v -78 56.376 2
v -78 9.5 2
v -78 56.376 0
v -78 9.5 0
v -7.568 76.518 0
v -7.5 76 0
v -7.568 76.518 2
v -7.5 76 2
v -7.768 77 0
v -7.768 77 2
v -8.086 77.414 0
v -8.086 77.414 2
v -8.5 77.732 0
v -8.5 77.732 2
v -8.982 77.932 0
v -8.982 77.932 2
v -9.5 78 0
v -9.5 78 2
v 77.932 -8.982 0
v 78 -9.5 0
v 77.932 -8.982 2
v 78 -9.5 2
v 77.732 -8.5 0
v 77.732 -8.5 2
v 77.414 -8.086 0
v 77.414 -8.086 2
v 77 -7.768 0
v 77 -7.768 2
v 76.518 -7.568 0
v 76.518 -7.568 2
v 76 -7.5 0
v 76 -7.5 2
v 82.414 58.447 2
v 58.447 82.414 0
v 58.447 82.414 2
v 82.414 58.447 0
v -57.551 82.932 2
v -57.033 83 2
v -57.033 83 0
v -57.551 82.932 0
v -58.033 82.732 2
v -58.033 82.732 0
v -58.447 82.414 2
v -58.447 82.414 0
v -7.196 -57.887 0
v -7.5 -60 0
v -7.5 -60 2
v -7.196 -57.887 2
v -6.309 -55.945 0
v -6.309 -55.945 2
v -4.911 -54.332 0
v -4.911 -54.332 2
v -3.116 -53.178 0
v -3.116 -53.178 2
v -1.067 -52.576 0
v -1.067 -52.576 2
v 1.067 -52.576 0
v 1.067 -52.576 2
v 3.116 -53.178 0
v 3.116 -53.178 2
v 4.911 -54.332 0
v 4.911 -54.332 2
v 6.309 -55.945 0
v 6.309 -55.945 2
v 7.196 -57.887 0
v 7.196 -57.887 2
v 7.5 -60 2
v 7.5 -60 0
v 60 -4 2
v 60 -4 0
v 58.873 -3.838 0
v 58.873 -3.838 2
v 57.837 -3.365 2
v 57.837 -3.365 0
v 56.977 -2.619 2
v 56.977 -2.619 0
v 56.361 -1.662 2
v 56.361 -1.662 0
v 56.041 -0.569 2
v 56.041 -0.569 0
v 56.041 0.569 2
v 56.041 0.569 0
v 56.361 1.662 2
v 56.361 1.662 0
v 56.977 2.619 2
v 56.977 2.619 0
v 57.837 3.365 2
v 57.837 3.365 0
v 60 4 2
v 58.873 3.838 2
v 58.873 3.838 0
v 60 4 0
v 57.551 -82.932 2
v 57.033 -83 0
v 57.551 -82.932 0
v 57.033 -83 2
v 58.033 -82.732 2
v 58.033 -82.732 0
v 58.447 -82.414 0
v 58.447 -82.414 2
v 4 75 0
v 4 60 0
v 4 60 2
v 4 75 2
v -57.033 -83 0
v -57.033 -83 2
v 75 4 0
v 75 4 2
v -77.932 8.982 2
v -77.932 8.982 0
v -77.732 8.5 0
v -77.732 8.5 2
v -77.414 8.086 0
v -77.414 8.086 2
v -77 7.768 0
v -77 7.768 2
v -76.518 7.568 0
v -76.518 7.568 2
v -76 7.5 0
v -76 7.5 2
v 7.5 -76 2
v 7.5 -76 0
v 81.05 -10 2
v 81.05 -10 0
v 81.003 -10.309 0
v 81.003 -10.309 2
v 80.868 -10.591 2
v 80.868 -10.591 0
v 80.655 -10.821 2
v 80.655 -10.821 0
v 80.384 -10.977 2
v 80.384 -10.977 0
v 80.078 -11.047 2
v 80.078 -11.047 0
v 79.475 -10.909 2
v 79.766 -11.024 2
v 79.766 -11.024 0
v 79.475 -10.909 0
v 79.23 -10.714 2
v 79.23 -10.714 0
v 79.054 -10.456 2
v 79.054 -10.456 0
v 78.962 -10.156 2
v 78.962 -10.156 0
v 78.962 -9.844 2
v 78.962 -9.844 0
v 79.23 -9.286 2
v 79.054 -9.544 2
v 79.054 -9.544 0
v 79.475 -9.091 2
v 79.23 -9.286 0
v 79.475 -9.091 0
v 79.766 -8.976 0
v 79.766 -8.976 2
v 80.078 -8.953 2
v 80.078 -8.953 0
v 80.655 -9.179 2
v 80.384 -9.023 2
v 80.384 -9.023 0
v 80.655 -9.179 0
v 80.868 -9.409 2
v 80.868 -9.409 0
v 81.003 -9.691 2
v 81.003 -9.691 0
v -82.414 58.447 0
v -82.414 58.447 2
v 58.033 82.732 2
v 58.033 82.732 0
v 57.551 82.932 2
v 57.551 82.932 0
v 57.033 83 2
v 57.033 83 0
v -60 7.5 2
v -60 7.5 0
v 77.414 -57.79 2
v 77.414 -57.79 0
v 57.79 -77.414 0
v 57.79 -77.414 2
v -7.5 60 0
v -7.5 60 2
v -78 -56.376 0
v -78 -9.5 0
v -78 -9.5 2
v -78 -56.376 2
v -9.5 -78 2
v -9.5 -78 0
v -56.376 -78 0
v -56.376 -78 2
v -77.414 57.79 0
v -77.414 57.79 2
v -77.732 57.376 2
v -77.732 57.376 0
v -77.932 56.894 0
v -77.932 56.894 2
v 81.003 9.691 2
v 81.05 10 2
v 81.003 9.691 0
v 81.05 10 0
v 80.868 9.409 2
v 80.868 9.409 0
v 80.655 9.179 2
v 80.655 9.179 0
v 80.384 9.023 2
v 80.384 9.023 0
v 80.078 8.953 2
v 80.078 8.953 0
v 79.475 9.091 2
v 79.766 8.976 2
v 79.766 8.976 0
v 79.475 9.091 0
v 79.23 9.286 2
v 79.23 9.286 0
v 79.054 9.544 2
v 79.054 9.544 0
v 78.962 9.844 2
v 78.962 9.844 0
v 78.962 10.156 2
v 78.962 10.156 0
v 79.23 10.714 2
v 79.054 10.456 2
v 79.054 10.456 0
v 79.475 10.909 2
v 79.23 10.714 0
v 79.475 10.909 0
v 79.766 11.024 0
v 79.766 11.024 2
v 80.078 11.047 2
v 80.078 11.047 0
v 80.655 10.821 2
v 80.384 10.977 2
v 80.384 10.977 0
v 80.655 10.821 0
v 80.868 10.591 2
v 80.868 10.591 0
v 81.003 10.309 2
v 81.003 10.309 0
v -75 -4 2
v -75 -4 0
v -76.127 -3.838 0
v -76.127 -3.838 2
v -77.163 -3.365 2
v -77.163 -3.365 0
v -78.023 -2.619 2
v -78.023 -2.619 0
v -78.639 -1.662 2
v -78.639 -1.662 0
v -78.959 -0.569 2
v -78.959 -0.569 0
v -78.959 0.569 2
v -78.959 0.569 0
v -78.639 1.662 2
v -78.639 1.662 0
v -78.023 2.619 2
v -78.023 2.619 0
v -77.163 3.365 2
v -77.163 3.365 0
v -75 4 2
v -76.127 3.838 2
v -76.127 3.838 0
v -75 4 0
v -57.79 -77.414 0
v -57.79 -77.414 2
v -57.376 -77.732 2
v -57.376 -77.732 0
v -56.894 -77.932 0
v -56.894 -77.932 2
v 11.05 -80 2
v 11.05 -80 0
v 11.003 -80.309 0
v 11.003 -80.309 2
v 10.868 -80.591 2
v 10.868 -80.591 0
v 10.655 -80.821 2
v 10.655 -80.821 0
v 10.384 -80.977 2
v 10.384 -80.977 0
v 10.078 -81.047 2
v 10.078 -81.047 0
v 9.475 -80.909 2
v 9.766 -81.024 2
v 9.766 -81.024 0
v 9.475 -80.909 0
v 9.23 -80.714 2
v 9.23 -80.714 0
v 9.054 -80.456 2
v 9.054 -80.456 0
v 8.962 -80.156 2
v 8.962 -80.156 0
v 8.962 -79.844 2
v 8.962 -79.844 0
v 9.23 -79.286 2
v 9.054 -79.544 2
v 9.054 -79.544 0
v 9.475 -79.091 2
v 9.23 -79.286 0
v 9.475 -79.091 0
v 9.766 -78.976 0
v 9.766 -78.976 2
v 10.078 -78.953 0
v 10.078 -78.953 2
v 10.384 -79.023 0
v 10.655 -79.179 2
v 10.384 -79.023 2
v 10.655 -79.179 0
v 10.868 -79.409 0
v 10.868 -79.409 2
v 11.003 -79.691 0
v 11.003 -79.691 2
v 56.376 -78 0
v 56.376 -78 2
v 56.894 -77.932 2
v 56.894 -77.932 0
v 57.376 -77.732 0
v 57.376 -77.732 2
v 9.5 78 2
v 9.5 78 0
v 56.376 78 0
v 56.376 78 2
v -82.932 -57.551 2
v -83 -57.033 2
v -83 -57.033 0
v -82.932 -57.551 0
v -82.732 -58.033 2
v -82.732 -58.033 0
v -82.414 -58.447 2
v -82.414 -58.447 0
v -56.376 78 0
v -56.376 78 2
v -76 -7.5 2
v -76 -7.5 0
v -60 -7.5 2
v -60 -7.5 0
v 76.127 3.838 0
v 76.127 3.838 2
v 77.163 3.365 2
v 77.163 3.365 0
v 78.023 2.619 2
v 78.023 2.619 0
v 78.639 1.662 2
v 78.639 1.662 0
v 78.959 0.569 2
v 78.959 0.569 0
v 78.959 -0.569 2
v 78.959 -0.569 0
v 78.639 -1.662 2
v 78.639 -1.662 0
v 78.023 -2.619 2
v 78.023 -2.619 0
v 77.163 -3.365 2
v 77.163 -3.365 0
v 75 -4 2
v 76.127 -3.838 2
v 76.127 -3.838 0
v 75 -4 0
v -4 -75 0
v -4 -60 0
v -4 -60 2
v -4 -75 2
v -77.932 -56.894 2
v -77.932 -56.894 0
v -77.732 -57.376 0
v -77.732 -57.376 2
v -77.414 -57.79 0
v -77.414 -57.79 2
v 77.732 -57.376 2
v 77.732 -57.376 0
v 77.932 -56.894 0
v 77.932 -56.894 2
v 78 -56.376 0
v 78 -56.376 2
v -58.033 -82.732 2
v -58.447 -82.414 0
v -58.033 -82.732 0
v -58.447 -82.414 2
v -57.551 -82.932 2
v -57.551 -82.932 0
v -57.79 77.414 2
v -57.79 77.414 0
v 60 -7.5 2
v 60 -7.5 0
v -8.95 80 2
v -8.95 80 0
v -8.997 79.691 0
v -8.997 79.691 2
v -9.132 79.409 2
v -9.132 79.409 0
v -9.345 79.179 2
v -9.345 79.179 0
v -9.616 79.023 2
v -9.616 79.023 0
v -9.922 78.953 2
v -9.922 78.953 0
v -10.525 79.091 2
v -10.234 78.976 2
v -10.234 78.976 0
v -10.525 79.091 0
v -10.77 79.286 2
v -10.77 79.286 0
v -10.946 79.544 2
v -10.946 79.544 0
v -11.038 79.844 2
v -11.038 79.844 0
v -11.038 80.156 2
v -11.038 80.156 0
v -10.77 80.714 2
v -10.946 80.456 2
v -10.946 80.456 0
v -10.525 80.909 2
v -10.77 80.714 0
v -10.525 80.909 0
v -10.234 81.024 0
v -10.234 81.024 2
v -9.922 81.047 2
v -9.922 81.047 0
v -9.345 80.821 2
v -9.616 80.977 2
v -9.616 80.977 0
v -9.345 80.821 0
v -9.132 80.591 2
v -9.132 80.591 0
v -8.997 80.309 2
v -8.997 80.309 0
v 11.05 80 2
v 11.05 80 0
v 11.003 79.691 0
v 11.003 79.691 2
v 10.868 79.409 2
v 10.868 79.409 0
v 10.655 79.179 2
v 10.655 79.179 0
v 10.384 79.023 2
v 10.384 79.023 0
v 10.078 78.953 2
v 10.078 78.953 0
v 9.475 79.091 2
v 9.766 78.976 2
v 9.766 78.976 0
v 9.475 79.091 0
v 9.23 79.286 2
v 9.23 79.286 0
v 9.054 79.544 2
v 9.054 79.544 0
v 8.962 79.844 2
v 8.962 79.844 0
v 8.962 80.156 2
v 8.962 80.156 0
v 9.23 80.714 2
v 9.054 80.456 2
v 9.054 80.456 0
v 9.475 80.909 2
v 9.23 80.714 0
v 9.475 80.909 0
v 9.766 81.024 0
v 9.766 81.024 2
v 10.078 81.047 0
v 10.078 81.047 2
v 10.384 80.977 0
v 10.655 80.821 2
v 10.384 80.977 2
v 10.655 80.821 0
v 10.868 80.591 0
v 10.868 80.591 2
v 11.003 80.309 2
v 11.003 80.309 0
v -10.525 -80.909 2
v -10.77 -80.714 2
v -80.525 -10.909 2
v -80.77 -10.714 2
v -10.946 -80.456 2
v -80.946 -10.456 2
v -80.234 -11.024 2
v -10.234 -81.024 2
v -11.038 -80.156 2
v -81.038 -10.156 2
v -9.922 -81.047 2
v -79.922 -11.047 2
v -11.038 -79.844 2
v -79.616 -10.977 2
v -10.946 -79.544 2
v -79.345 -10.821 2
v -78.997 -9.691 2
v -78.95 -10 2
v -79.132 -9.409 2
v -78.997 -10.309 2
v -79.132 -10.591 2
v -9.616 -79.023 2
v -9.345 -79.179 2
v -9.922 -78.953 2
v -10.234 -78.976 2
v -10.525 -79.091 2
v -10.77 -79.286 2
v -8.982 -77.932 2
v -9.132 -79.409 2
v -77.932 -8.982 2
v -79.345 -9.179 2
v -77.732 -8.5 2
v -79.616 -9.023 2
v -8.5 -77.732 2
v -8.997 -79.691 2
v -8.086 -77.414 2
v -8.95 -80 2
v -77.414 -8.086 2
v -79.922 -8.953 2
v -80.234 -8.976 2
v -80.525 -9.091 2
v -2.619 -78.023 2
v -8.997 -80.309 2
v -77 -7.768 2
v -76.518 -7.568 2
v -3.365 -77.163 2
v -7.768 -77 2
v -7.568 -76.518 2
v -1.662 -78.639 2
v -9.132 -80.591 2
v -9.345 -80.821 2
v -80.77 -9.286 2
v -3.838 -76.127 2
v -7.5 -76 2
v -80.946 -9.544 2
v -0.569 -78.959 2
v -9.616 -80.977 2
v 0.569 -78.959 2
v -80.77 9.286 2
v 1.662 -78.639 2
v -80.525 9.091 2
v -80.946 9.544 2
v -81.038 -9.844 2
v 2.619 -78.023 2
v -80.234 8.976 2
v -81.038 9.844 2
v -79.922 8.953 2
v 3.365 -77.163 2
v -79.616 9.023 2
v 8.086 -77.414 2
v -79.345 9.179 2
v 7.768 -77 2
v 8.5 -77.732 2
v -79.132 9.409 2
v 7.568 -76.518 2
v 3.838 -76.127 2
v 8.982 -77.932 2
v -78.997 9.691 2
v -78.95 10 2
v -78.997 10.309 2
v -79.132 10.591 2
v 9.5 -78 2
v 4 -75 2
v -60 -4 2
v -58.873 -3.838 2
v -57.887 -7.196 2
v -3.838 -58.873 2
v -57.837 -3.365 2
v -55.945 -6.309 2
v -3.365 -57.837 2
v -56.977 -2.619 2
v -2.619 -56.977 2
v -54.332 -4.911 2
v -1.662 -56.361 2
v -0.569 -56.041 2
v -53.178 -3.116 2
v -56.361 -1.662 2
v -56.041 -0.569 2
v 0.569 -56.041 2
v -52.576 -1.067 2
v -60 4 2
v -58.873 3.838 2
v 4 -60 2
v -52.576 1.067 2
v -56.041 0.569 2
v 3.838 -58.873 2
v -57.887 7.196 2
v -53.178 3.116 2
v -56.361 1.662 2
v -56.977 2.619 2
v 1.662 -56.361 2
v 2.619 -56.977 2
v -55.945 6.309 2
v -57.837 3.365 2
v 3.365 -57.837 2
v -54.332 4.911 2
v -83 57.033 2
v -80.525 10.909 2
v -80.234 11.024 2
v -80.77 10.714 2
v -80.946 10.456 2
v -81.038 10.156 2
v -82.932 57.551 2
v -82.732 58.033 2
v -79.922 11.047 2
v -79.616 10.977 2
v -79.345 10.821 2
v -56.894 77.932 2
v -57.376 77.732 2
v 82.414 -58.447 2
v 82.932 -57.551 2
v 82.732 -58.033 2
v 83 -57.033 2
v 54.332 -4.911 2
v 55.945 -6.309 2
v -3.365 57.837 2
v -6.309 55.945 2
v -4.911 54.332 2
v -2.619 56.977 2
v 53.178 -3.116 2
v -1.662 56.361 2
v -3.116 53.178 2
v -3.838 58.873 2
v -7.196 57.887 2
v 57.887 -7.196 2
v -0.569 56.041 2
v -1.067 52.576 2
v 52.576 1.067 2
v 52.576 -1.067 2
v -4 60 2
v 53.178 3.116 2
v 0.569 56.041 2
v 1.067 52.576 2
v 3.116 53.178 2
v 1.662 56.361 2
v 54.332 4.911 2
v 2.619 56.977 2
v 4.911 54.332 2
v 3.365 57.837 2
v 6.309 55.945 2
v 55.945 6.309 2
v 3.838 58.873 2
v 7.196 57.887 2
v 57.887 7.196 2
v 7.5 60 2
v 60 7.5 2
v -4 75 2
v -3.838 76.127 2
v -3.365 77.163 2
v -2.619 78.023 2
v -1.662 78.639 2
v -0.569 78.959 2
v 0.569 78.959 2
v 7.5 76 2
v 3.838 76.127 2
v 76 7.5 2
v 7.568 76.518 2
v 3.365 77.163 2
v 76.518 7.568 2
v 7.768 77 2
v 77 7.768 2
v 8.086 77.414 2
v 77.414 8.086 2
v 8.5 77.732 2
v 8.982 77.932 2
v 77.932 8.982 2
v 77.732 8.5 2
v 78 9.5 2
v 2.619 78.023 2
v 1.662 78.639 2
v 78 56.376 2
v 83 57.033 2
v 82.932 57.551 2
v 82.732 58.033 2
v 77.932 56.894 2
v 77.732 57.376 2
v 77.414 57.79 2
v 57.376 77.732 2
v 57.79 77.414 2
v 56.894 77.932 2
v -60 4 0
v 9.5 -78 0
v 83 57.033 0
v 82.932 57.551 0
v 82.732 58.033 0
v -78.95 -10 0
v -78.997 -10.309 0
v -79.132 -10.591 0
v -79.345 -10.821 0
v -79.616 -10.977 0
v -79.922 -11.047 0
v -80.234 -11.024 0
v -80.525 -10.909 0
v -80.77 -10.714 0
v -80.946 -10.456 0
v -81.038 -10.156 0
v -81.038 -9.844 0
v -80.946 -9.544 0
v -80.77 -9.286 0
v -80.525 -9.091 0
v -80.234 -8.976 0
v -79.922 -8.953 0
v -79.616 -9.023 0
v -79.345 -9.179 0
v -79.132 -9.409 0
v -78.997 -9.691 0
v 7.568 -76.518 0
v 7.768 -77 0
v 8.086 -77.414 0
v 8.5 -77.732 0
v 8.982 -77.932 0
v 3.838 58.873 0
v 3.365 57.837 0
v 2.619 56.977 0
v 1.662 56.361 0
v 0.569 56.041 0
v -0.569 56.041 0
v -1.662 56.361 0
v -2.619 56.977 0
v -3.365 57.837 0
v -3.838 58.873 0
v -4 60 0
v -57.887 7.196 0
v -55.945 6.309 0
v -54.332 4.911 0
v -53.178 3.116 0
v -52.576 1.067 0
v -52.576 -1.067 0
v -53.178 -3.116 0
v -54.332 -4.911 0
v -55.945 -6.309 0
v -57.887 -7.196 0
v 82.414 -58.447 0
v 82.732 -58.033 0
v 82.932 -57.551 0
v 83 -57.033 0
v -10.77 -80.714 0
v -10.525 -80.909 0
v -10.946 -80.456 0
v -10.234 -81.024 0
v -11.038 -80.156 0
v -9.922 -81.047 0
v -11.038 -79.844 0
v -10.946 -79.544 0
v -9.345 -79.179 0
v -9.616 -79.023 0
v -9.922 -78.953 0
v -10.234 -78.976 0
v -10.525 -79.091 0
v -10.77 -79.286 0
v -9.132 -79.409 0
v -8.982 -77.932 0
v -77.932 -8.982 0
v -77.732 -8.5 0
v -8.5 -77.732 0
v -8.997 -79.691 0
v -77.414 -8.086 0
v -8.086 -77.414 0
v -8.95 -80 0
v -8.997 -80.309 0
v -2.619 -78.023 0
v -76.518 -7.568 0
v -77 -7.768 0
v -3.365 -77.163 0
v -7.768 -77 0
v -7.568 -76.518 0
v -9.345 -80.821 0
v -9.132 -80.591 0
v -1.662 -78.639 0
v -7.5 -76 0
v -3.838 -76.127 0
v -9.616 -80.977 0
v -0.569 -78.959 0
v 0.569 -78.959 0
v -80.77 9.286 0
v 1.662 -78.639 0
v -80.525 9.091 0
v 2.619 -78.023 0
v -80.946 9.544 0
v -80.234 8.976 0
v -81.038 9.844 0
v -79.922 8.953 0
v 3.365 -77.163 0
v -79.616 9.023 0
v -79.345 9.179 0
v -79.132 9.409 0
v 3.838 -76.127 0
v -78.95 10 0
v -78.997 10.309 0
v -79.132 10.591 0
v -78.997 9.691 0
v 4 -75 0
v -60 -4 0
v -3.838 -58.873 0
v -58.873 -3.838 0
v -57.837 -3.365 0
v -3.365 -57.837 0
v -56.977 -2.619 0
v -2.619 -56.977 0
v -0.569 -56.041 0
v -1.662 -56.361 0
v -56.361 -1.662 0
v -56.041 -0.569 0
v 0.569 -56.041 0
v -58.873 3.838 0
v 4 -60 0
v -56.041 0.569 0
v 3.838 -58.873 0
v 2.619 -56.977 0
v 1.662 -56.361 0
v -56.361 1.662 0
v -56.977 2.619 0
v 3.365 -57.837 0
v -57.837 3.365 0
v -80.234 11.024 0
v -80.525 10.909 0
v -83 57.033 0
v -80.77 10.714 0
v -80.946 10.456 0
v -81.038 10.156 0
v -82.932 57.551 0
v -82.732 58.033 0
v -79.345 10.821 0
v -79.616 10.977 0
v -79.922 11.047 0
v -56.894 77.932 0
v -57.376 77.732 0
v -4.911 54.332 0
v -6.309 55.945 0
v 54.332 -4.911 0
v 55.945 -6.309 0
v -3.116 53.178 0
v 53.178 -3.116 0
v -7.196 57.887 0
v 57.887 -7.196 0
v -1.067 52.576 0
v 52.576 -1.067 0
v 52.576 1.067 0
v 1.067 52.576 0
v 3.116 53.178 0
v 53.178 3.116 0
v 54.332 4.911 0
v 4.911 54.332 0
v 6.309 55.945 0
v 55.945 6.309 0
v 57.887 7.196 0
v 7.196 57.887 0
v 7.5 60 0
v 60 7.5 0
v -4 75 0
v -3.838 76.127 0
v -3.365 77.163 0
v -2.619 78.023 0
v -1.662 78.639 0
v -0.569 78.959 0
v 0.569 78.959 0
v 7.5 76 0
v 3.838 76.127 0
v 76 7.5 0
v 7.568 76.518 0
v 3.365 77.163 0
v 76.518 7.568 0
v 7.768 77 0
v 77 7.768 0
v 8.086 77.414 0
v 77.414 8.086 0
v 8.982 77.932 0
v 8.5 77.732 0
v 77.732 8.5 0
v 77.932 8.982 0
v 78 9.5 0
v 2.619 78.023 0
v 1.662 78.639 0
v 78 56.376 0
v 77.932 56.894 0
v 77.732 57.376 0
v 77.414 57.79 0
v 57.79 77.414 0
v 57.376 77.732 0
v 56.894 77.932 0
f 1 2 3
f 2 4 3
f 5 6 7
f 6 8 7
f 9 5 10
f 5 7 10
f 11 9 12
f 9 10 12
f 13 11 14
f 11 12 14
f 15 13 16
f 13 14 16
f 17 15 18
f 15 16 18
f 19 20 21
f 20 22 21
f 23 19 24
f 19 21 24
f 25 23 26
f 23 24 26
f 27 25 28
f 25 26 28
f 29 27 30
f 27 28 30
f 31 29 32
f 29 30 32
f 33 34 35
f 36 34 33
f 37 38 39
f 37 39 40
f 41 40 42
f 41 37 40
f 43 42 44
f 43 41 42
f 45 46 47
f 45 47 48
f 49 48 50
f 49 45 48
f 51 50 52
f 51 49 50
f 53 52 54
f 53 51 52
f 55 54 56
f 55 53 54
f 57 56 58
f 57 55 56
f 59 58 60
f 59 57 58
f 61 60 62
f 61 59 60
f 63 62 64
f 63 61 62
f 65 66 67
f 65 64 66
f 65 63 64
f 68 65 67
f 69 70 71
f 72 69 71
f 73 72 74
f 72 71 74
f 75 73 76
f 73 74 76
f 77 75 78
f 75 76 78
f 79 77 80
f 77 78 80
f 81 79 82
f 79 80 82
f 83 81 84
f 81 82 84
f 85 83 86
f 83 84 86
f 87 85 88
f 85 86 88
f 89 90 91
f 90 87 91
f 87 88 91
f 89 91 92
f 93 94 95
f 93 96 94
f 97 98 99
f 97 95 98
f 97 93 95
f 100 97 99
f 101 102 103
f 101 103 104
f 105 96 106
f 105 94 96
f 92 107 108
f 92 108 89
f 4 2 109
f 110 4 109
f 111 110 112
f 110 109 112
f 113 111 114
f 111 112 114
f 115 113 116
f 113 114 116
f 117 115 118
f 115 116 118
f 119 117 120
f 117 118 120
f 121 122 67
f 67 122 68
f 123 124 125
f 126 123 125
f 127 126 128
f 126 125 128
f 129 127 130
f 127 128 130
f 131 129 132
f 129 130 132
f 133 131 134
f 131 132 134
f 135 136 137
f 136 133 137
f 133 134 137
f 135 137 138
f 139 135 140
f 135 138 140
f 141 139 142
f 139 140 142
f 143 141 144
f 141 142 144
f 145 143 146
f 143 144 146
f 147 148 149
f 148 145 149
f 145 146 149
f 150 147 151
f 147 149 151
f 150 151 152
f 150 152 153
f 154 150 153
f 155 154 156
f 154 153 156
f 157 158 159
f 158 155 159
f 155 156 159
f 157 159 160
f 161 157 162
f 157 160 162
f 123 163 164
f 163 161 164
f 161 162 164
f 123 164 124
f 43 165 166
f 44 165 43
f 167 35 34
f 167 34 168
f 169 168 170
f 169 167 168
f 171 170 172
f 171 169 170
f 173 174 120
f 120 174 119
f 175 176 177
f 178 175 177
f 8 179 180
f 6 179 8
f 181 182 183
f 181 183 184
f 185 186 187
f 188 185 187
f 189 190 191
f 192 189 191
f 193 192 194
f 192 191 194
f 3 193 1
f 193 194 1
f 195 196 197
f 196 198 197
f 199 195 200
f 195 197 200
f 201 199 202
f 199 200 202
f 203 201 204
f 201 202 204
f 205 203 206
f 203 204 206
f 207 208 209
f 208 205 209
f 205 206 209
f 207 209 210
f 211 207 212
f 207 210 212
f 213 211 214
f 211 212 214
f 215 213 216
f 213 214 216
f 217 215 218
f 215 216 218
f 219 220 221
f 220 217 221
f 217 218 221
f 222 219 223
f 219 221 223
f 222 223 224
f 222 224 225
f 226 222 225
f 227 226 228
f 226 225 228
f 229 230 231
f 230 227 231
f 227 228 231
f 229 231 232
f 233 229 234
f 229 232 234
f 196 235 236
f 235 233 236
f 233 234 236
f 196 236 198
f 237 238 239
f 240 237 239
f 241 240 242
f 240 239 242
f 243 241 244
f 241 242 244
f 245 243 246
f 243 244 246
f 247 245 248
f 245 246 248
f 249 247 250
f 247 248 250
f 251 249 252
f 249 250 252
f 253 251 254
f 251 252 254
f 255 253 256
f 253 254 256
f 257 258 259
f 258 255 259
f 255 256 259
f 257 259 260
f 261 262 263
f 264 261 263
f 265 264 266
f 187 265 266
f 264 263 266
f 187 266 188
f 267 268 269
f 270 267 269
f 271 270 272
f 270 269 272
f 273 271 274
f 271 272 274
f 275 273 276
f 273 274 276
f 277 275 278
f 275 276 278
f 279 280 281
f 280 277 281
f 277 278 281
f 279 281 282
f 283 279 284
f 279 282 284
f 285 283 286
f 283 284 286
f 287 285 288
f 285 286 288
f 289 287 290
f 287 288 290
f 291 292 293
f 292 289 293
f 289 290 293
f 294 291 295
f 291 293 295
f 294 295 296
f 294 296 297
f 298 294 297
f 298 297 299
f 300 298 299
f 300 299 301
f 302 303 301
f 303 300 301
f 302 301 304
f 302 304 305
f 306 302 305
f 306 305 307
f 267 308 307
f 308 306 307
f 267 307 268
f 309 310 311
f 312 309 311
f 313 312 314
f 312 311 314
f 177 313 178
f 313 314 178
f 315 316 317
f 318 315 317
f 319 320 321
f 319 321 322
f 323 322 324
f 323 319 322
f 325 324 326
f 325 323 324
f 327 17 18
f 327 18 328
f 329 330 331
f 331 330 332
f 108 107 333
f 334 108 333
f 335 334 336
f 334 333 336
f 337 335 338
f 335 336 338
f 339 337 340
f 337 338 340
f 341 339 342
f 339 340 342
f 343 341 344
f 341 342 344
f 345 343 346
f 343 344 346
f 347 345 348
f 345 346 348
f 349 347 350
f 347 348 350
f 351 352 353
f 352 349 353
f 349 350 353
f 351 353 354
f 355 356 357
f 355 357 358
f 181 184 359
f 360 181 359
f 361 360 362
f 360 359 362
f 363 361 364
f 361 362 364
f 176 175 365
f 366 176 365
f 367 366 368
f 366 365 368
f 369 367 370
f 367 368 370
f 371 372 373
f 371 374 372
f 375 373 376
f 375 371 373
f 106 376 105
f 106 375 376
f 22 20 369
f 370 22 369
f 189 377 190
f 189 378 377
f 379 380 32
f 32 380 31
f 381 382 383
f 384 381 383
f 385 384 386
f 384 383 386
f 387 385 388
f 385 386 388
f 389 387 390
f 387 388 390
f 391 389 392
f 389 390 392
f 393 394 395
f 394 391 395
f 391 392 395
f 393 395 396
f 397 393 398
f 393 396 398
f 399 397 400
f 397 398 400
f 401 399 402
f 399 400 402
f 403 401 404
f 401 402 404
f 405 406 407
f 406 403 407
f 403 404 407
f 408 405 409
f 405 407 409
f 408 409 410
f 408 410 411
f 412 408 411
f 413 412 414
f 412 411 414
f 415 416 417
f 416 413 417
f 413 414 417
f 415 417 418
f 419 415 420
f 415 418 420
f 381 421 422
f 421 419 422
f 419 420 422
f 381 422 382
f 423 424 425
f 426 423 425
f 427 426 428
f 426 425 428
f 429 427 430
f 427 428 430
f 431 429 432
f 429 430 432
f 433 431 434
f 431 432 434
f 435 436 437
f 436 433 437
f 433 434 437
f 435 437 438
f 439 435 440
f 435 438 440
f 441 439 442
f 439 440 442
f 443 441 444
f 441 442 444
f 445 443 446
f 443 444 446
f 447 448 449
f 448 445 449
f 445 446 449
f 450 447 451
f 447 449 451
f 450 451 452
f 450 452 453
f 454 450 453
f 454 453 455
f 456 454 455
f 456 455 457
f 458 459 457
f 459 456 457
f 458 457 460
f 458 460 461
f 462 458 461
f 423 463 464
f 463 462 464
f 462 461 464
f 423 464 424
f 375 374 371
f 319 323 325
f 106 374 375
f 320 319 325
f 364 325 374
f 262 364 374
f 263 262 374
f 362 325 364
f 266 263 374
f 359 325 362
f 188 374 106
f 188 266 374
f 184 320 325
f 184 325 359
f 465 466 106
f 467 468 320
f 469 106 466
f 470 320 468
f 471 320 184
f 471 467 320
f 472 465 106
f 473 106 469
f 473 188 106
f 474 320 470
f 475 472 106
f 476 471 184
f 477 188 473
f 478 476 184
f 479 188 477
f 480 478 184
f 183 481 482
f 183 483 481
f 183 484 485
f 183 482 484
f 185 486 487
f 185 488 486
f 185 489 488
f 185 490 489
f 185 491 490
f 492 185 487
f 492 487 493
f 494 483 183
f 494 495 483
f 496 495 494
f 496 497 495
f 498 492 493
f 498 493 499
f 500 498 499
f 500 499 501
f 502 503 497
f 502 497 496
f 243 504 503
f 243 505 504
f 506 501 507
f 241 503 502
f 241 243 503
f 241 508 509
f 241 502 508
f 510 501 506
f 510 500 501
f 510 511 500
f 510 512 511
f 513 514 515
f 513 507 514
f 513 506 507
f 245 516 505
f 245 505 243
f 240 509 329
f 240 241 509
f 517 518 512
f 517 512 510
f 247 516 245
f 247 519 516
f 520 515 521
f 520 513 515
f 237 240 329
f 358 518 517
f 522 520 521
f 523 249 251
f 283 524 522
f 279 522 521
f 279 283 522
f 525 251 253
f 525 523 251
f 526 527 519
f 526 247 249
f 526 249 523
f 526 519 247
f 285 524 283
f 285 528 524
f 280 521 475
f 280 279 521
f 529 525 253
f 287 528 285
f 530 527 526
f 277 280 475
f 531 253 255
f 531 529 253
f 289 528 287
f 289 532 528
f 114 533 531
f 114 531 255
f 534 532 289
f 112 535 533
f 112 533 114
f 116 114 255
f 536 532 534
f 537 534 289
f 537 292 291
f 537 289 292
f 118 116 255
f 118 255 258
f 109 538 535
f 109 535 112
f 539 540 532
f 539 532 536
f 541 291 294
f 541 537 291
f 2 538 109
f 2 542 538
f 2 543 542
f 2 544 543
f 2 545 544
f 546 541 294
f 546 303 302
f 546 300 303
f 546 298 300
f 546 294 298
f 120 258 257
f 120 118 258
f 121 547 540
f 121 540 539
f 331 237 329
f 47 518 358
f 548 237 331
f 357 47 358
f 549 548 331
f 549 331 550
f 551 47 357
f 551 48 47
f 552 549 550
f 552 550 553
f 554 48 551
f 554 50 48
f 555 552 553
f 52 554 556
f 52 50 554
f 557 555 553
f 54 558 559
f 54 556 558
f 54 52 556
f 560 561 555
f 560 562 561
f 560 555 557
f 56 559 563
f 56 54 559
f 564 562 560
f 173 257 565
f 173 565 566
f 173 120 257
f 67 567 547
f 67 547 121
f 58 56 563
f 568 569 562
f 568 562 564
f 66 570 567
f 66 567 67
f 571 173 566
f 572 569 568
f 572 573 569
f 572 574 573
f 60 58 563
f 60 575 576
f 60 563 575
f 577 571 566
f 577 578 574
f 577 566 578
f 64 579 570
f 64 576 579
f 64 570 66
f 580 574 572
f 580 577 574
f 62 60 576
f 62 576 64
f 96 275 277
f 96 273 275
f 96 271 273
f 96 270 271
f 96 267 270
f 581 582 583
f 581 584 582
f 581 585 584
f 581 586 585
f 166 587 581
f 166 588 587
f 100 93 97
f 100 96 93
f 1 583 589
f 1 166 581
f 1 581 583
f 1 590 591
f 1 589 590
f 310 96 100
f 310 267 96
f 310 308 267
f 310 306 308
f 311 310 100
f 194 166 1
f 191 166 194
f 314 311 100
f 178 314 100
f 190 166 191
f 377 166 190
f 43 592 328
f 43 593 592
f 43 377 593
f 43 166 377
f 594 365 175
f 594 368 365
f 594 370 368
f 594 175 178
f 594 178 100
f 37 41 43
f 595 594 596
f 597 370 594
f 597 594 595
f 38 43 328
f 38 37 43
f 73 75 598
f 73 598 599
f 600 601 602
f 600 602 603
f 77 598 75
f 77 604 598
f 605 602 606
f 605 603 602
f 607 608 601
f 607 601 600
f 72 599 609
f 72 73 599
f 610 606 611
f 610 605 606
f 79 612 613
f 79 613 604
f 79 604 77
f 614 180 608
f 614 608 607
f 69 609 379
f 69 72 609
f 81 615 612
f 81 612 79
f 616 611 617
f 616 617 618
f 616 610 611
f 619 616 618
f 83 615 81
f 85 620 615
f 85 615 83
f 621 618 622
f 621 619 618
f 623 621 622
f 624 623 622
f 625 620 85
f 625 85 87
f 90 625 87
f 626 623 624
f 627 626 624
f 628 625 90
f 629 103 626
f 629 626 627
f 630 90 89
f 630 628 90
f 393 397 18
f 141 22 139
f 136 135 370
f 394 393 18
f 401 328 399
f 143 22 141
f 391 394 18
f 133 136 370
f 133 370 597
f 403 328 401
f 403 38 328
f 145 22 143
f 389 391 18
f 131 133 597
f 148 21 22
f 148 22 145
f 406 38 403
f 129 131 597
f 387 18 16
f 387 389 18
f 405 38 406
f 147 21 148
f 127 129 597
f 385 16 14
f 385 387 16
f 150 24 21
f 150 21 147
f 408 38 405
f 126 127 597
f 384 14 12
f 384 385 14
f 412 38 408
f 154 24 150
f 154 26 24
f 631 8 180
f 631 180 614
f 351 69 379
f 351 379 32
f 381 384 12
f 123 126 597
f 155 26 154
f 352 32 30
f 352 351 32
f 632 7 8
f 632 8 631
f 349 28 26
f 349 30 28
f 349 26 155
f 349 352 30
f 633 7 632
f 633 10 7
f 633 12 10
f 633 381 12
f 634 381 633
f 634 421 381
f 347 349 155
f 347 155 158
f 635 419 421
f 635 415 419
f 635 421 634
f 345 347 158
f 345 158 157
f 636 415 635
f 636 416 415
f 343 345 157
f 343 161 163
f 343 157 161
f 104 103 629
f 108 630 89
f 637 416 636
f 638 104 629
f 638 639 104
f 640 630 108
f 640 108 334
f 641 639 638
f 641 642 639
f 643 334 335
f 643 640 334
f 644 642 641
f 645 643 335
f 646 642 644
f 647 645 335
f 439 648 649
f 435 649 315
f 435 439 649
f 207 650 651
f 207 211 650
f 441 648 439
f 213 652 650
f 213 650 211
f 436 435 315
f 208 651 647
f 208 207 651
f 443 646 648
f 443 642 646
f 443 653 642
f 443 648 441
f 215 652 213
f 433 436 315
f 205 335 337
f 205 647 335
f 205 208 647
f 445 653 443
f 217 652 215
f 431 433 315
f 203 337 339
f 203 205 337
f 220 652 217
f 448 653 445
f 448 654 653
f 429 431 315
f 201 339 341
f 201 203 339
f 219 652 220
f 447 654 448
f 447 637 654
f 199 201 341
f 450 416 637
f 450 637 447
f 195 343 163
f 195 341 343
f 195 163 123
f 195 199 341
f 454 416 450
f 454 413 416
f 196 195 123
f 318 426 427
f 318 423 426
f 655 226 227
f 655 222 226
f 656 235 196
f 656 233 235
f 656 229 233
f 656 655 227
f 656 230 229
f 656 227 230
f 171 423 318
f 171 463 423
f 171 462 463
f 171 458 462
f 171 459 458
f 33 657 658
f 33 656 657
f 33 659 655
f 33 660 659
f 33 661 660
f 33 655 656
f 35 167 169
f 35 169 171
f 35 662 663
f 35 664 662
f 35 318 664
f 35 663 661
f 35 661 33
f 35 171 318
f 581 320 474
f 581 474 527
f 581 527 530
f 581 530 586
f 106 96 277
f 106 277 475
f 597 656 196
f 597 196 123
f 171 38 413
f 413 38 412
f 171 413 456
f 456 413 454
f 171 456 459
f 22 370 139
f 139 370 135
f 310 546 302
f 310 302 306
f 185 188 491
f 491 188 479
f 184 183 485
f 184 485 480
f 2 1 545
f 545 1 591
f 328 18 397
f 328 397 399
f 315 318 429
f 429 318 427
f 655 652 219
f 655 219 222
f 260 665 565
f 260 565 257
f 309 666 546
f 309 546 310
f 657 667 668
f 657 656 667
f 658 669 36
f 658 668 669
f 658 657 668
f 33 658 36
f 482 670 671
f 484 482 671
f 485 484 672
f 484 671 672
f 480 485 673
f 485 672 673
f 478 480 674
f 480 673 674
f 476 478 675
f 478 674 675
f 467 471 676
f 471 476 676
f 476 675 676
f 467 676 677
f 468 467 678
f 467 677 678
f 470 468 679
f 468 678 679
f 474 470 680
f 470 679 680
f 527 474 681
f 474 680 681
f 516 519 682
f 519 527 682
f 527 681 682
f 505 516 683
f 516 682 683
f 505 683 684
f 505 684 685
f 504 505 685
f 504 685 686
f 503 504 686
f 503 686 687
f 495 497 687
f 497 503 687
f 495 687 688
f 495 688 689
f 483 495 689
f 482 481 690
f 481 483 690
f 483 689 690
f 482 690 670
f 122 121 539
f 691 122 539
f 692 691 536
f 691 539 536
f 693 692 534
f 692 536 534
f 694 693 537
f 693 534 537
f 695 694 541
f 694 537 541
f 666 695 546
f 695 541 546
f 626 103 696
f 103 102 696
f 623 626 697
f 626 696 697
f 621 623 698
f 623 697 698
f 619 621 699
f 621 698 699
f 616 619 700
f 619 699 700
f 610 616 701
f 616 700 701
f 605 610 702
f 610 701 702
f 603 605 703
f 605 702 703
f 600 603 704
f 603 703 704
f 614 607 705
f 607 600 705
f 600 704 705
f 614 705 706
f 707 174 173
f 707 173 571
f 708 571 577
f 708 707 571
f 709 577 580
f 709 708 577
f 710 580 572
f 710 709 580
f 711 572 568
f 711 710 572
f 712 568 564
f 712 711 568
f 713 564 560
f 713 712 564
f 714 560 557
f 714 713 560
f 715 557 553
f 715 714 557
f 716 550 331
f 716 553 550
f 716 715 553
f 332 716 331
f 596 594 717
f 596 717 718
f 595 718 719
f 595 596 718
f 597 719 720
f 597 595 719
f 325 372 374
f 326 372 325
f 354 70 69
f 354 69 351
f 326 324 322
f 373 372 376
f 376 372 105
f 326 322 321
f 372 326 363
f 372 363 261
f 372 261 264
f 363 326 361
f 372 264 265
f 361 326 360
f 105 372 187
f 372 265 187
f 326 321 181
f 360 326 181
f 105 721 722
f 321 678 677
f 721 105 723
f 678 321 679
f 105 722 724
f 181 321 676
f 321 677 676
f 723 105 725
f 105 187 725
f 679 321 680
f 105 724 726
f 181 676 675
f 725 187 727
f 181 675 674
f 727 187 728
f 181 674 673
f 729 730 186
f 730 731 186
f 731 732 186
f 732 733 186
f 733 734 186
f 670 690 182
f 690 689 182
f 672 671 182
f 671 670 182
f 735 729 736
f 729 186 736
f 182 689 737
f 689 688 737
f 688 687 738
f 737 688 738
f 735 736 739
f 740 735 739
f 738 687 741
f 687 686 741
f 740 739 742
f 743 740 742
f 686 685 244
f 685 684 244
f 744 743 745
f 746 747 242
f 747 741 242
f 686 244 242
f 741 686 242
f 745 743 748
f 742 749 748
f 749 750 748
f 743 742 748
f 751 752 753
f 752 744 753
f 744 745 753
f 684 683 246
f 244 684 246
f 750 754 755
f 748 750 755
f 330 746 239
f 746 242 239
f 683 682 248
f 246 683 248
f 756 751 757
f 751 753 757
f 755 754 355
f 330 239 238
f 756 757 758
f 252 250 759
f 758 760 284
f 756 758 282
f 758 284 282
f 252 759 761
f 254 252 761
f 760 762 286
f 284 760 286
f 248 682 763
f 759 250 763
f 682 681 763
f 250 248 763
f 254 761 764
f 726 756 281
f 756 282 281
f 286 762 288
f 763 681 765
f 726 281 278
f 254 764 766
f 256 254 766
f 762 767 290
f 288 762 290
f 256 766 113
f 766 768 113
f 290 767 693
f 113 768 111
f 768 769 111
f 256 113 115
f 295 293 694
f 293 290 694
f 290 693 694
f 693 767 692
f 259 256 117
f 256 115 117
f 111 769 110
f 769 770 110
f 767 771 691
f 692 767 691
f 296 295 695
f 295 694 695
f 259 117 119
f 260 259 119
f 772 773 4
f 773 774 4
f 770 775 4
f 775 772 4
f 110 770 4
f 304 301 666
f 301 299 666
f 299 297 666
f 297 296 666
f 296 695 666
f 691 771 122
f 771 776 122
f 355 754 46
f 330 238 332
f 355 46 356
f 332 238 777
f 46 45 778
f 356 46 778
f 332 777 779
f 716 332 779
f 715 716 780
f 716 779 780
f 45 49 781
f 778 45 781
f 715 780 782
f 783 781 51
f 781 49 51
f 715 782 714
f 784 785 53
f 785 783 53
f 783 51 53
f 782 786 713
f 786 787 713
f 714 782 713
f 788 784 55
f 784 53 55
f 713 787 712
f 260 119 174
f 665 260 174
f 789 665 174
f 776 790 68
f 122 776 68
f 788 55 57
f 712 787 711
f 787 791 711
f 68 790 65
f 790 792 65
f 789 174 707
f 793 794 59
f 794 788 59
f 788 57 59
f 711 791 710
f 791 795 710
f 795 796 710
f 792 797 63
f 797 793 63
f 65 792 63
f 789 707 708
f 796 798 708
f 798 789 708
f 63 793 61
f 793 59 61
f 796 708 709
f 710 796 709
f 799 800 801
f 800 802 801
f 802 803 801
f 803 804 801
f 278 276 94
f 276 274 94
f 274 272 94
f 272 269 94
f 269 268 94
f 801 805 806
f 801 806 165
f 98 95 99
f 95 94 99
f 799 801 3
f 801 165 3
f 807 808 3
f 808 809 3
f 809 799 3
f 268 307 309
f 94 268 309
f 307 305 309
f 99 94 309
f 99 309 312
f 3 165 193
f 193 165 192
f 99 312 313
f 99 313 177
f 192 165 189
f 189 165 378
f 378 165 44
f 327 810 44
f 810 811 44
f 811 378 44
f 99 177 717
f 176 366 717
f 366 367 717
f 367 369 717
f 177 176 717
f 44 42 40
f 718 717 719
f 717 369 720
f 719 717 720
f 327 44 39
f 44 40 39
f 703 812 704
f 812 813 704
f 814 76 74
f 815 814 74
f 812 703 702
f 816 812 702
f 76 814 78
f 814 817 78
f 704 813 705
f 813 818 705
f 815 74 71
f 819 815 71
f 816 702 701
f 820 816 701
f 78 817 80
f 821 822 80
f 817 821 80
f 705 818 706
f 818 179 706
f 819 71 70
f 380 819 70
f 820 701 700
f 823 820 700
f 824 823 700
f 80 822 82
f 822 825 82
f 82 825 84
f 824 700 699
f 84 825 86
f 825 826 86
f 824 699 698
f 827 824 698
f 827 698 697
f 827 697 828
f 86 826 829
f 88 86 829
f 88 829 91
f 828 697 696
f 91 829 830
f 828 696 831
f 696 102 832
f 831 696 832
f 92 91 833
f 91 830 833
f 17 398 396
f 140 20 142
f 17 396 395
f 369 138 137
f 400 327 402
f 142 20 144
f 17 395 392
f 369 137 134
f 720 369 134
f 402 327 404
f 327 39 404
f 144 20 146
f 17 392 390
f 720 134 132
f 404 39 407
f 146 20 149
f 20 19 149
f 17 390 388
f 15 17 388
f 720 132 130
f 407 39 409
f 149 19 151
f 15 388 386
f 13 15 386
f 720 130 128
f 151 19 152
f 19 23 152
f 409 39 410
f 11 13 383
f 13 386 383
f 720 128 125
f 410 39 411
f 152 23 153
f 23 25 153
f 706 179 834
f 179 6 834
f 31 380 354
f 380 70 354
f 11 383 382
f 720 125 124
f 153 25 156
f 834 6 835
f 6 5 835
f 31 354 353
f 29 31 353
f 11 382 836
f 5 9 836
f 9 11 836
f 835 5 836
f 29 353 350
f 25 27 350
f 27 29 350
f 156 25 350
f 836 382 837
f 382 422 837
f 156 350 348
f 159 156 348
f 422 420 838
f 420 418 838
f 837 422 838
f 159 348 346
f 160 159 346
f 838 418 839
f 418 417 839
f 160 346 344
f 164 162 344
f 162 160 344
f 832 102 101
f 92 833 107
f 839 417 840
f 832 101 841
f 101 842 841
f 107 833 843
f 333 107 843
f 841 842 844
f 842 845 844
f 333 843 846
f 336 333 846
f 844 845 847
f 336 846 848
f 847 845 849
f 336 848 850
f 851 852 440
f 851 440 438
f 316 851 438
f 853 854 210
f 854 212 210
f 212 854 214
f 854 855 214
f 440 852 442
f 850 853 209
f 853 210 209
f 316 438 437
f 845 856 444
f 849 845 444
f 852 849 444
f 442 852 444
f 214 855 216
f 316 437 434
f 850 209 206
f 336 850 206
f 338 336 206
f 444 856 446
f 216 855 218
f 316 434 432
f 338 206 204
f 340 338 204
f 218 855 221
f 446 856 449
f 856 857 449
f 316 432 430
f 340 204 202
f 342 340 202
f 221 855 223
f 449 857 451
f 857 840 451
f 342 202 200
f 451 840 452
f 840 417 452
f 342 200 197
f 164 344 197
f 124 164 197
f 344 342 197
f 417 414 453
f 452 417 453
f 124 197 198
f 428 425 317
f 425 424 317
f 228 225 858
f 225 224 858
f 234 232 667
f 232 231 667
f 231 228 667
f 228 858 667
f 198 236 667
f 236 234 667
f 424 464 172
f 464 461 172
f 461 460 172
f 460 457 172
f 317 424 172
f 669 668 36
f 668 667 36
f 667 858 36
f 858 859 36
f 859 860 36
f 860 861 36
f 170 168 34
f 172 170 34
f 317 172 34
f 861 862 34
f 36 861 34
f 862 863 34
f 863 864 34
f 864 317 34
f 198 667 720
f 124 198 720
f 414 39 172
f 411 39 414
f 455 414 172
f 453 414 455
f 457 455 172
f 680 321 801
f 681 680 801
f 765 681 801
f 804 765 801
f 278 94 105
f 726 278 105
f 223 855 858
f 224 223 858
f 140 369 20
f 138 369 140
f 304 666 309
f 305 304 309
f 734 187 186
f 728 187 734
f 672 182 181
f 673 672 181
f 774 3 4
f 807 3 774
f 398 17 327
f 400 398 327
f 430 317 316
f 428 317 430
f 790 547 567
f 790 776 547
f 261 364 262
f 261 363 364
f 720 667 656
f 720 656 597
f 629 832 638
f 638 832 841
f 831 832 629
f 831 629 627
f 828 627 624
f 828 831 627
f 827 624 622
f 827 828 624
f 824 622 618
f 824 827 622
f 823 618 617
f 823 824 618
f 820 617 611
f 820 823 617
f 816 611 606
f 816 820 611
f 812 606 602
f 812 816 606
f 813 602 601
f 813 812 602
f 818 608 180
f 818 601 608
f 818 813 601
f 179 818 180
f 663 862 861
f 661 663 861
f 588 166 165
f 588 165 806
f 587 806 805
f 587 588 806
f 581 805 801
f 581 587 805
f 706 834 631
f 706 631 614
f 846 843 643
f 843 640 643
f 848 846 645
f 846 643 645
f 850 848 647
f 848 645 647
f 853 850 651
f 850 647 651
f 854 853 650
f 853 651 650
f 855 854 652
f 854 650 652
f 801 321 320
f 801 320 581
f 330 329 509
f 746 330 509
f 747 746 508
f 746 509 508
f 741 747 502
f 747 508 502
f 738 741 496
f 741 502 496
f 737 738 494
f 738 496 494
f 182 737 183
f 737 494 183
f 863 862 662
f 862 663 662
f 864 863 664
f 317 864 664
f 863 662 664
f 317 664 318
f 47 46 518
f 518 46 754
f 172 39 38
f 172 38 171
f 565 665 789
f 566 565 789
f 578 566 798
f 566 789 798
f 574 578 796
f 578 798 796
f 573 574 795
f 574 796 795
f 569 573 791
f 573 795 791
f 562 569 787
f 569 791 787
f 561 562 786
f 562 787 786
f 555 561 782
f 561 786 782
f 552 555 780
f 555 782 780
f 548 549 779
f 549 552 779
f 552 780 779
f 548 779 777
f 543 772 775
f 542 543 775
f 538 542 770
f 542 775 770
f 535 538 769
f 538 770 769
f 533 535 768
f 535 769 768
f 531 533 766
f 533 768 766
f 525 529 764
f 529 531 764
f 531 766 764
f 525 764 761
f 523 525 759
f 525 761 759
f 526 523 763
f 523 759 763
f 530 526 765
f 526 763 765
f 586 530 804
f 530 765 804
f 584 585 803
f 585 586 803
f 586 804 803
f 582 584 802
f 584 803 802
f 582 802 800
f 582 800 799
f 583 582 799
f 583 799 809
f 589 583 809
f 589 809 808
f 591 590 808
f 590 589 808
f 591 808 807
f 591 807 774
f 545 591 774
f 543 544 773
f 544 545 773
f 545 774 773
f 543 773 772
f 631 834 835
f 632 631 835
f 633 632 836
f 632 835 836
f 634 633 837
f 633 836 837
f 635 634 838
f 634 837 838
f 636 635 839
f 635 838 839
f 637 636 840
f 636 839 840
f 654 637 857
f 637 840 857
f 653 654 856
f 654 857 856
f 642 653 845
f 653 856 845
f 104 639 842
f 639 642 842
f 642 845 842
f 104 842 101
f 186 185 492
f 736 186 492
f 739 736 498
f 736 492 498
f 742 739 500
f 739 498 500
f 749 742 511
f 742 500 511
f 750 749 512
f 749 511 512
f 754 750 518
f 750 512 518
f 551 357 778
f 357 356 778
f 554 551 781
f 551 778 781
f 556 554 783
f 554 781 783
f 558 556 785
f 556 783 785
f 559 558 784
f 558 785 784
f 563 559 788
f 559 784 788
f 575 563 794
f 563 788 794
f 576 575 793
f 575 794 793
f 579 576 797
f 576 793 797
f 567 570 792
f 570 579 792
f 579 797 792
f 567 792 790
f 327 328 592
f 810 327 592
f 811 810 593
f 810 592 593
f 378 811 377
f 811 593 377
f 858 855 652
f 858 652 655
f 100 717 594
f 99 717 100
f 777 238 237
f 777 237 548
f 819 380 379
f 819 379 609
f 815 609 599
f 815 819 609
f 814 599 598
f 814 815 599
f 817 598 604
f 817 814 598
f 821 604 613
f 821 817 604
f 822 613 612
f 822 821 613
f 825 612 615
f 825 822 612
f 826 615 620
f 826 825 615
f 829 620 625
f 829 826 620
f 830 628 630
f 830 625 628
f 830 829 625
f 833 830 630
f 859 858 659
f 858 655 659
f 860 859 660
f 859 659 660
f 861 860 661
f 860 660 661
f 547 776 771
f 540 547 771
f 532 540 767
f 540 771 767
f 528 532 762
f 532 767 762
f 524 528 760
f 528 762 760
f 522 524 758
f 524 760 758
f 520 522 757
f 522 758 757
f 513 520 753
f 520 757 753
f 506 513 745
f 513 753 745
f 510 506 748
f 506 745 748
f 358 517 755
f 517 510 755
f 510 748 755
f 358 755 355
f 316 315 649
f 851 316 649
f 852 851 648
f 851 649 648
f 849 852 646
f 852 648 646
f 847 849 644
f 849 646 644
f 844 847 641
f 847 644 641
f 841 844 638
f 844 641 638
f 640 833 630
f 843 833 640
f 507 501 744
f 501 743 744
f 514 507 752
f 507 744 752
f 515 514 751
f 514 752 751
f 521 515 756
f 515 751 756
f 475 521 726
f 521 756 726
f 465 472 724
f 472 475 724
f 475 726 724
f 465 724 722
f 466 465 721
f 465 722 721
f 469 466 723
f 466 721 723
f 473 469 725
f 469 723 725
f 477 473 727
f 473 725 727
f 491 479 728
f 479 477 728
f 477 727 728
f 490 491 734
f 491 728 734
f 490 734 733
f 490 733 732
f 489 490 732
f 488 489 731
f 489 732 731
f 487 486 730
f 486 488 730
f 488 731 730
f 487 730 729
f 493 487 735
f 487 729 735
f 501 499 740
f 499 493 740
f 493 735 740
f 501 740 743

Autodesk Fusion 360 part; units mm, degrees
sketch "草图1" plane through (0, 0, 0) normal (0, 0, 1) x (1, 0, 0)
  line L0 (7.5, 60) -> (7.5, 75)
  circle A0 centre (-42.5, 42.5) radius 32.5 construction
  arc A1 (-7.5, 60) -> (7.5, 60) centre (0, 60) ccw
  circle A2 centre (42.5, 42.5) radius 32.5 construction
  circle A3 centre (-10, 80) radius 1.05
  line L1 (-7.5, 75) -> (-7.5, 60)
  line L2 (57.8614, 83) -> (0, 83)
  line L3 (0, 60) -> (0, 75) construction
  circle A4 centre (10, 80) radius 1.05
  circle A5 centre (42.5, -42.5) radius 32.5 construction
  circle A6 centre (-42.5, -42.5) radius 32.5 construction
  arc A7 (7.5, 75) -> (-7.5, 75) centre (0, 75) ccw construction
  line L4 (7.5, 75) -> (7.5, 78)
  line L5 (7.5, 78) -> (57.2046, 78)
  line L6 (0, 0) -> (89.0494, 89.0494) construction
  line L7 (57.2046, 78) -> (67.6023, 67.6023)
  line L8 (57.8614, 83) -> (70.4307, 70.4307)
  line L9 (-57.8614, 83) -> (0, 83)
  line L10 (-57.8614, 83) -> (-70.4307, 70.4307)
  line L11 (-57.2046, 78) -> (-67.6023, 67.6023)
  line L12 (-7.5, 78) -> (-57.2046, 78)
  line L13 (-7.5, 75) -> (-7.5, 78)
  line L14 (-4, 75) -> (-4, 60)
  arc A8 (-4, 60) -> (4, 60) centre (0, 60) ccw
  line L15 (4, 60) -> (4, 75)
  arc A9 (4, 75) -> (-4, 75) centre (0, 75) ccw
  line L16 (0, 75) -> (0, 60) construction
  line L17 (-83, -57.8614) -> (-70.4307, -70.4307)
  line L18 (-83, -57.8614) -> (-83, 0)
  line L19 (-83, 57.8614) -> (-83, 0)
  line L20 (-83, 57.8614) -> (-70.4307, 70.4307)
  line L21 (-78, 57.2046) -> (-67.6023, 67.6023)
  line L22 (-78, 7.5) -> (-78, 57.2046)
  line L23 (-75, 7.5) -> (-78, 7.5)
  line L24 (-60, 7.5) -> (-75, 7.5)
  arc A10 (-60, -7.5) -> (-60, 7.5) centre (-60, 0) ccw
  line L25 (-75, -7.5) -> (-60, -7.5)
  line L26 (-75, -7.5) -> (-78, -7.5)
  line L27 (-78, -7.5) -> (-78, -57.2046)
  line L28 (-78, -57.2046) -> (-67.6023, -67.6023)
  line L29 (-75, -4) -> (-60, -4)
  arc A11 (-75, 4) -> (-75, -4) centre (-75, 0) ccw
  line L30 (-60, 4) -> (-75, 4)
  arc A12 (-60, -4) -> (-60, 4) centre (-60, 0) ccw
  circle A13 centre (-80, -10) radius 1.05
  circle A14 centre (-80, 10) radius 1.05
  line L31 (57.8614, -83) -> (70.4307, -70.4307)
  line L32 (57.8614, -83) -> (0, -83)
  line L33 (-57.8614, -83) -> (0, -83)
  line L34 (-57.8614, -83) -> (-70.4307, -70.4307)
  line L35 (-57.2046, -78) -> (-67.6023, -67.6023)
  line L36 (-7.5, -78) -> (-57.2046, -78)
  line L37 (-7.5, -75) -> (-7.5, -78)
  line L38 (-7.5, -60) -> (-7.5, -75)
  arc A15 (7.5, -60) -> (-7.5, -60) centre (0, -60) ccw
  line L39 (7.5, -75) -> (7.5, -60)
  line L40 (7.5, -75) -> (7.5, -78)
  line L41 (7.5, -78) -> (57.2046, -78)
  line L42 (57.2046, -78) -> (67.6023, -67.6023)
  line L43 (4, -75) -> (4, -60)
  arc A16 (-4, -75) -> (4, -75) centre (0, -75) ccw
  line L44 (-4, -60) -> (-4, -75)
  arc A17 (4, -60) -> (-4, -60) centre (0, -60) ccw
  circle A18 centre (10, -80) radius 1.05
  circle A19 centre (-10, -80) radius 1.05
  line L45 (83, 57.8614) -> (70.4307, 70.4307)
  line L46 (83, 57.8614) -> (83, 0)
  line L47 (83, -57.8614) -> (83, 0)
  line L48 (83, -57.8614) -> (70.4307, -70.4307)
  line L49 (78, -57.2046) -> (67.6023, -67.6023)
  line L50 (78, -7.5) -> (78, -57.2046)
  line L51 (75, -7.5) -> (78, -7.5)
  line L52 (60, -7.5) -> (75, -7.5)
  arc A20 (60, 7.5) -> (60, -7.5) centre (60, 0) ccw
  line L53 (75, 7.5) -> (60, 7.5)
  line L54 (75, 7.5) -> (78, 7.5)
  line L55 (78, 7.5) -> (78, 57.2046)
  line L56 (78, 57.2046) -> (67.6023, 67.6023)
  line L57 (75, 4) -> (60, 4)
  arc A21 (75, -4) -> (75, 4) centre (75, 0) ccw
  line L58 (60, -4) -> (75, -4)
  arc A22 (60, 4) -> (60, -4) centre (60, 0) ccw
  circle A23 centre (80, 10) radius 1.05
  circle A24 centre (80, -10) radius 1.05
  dimension "d3" = 65
  dimension "d4" = 65
  dimension "d5" = 65
  dimension "d6" = 65
  dimension "d7" = 15
  dimension "d8" = 15
  dimension "d10" = 2.1
  dimension "d11" = 5
  dimension "d12" = 10
  dimension "d15" = 3
  dimension "d16" = 2
  dimension "d17" = 60
  dimension "d18" = 35.5
  dimension "d19" = 4
  dimension "d20" = 8
  dimension "d22" = 360
extrude "拉伸1" add sketch "草图1" along normal blind 2
fillet "圆角1" radius 2 16 edges at (-57.2046, 78, 1) (57.2046, 78, 1) (78, 57.2046, 1) (-7.5, 78, 1) (7.5, 78, 1) (78, 7.5, 1) (78, -7.5, 1) (78, -57.2046, 1) (57.2046, -78, 1) (7.5, -78, 1) (-7.5, -78, 1) (-57.2046, -78, 1) (-78, -57.2046, 1) (-78, -7.5, 1) (-78, 7.5, 1) (-78, 57.2046, 1)
fillet "圆角2" radius 2 8 edges at (83, -57.8614, 1) (57.8614, -83, 1) (-57.8614, -83, 1) (-83, -57.8614, 1) (-83, 57.8614, 1) (-57.8614, 83, 1) (57.8614, 83, 1) (83, 57.8614, 1)
